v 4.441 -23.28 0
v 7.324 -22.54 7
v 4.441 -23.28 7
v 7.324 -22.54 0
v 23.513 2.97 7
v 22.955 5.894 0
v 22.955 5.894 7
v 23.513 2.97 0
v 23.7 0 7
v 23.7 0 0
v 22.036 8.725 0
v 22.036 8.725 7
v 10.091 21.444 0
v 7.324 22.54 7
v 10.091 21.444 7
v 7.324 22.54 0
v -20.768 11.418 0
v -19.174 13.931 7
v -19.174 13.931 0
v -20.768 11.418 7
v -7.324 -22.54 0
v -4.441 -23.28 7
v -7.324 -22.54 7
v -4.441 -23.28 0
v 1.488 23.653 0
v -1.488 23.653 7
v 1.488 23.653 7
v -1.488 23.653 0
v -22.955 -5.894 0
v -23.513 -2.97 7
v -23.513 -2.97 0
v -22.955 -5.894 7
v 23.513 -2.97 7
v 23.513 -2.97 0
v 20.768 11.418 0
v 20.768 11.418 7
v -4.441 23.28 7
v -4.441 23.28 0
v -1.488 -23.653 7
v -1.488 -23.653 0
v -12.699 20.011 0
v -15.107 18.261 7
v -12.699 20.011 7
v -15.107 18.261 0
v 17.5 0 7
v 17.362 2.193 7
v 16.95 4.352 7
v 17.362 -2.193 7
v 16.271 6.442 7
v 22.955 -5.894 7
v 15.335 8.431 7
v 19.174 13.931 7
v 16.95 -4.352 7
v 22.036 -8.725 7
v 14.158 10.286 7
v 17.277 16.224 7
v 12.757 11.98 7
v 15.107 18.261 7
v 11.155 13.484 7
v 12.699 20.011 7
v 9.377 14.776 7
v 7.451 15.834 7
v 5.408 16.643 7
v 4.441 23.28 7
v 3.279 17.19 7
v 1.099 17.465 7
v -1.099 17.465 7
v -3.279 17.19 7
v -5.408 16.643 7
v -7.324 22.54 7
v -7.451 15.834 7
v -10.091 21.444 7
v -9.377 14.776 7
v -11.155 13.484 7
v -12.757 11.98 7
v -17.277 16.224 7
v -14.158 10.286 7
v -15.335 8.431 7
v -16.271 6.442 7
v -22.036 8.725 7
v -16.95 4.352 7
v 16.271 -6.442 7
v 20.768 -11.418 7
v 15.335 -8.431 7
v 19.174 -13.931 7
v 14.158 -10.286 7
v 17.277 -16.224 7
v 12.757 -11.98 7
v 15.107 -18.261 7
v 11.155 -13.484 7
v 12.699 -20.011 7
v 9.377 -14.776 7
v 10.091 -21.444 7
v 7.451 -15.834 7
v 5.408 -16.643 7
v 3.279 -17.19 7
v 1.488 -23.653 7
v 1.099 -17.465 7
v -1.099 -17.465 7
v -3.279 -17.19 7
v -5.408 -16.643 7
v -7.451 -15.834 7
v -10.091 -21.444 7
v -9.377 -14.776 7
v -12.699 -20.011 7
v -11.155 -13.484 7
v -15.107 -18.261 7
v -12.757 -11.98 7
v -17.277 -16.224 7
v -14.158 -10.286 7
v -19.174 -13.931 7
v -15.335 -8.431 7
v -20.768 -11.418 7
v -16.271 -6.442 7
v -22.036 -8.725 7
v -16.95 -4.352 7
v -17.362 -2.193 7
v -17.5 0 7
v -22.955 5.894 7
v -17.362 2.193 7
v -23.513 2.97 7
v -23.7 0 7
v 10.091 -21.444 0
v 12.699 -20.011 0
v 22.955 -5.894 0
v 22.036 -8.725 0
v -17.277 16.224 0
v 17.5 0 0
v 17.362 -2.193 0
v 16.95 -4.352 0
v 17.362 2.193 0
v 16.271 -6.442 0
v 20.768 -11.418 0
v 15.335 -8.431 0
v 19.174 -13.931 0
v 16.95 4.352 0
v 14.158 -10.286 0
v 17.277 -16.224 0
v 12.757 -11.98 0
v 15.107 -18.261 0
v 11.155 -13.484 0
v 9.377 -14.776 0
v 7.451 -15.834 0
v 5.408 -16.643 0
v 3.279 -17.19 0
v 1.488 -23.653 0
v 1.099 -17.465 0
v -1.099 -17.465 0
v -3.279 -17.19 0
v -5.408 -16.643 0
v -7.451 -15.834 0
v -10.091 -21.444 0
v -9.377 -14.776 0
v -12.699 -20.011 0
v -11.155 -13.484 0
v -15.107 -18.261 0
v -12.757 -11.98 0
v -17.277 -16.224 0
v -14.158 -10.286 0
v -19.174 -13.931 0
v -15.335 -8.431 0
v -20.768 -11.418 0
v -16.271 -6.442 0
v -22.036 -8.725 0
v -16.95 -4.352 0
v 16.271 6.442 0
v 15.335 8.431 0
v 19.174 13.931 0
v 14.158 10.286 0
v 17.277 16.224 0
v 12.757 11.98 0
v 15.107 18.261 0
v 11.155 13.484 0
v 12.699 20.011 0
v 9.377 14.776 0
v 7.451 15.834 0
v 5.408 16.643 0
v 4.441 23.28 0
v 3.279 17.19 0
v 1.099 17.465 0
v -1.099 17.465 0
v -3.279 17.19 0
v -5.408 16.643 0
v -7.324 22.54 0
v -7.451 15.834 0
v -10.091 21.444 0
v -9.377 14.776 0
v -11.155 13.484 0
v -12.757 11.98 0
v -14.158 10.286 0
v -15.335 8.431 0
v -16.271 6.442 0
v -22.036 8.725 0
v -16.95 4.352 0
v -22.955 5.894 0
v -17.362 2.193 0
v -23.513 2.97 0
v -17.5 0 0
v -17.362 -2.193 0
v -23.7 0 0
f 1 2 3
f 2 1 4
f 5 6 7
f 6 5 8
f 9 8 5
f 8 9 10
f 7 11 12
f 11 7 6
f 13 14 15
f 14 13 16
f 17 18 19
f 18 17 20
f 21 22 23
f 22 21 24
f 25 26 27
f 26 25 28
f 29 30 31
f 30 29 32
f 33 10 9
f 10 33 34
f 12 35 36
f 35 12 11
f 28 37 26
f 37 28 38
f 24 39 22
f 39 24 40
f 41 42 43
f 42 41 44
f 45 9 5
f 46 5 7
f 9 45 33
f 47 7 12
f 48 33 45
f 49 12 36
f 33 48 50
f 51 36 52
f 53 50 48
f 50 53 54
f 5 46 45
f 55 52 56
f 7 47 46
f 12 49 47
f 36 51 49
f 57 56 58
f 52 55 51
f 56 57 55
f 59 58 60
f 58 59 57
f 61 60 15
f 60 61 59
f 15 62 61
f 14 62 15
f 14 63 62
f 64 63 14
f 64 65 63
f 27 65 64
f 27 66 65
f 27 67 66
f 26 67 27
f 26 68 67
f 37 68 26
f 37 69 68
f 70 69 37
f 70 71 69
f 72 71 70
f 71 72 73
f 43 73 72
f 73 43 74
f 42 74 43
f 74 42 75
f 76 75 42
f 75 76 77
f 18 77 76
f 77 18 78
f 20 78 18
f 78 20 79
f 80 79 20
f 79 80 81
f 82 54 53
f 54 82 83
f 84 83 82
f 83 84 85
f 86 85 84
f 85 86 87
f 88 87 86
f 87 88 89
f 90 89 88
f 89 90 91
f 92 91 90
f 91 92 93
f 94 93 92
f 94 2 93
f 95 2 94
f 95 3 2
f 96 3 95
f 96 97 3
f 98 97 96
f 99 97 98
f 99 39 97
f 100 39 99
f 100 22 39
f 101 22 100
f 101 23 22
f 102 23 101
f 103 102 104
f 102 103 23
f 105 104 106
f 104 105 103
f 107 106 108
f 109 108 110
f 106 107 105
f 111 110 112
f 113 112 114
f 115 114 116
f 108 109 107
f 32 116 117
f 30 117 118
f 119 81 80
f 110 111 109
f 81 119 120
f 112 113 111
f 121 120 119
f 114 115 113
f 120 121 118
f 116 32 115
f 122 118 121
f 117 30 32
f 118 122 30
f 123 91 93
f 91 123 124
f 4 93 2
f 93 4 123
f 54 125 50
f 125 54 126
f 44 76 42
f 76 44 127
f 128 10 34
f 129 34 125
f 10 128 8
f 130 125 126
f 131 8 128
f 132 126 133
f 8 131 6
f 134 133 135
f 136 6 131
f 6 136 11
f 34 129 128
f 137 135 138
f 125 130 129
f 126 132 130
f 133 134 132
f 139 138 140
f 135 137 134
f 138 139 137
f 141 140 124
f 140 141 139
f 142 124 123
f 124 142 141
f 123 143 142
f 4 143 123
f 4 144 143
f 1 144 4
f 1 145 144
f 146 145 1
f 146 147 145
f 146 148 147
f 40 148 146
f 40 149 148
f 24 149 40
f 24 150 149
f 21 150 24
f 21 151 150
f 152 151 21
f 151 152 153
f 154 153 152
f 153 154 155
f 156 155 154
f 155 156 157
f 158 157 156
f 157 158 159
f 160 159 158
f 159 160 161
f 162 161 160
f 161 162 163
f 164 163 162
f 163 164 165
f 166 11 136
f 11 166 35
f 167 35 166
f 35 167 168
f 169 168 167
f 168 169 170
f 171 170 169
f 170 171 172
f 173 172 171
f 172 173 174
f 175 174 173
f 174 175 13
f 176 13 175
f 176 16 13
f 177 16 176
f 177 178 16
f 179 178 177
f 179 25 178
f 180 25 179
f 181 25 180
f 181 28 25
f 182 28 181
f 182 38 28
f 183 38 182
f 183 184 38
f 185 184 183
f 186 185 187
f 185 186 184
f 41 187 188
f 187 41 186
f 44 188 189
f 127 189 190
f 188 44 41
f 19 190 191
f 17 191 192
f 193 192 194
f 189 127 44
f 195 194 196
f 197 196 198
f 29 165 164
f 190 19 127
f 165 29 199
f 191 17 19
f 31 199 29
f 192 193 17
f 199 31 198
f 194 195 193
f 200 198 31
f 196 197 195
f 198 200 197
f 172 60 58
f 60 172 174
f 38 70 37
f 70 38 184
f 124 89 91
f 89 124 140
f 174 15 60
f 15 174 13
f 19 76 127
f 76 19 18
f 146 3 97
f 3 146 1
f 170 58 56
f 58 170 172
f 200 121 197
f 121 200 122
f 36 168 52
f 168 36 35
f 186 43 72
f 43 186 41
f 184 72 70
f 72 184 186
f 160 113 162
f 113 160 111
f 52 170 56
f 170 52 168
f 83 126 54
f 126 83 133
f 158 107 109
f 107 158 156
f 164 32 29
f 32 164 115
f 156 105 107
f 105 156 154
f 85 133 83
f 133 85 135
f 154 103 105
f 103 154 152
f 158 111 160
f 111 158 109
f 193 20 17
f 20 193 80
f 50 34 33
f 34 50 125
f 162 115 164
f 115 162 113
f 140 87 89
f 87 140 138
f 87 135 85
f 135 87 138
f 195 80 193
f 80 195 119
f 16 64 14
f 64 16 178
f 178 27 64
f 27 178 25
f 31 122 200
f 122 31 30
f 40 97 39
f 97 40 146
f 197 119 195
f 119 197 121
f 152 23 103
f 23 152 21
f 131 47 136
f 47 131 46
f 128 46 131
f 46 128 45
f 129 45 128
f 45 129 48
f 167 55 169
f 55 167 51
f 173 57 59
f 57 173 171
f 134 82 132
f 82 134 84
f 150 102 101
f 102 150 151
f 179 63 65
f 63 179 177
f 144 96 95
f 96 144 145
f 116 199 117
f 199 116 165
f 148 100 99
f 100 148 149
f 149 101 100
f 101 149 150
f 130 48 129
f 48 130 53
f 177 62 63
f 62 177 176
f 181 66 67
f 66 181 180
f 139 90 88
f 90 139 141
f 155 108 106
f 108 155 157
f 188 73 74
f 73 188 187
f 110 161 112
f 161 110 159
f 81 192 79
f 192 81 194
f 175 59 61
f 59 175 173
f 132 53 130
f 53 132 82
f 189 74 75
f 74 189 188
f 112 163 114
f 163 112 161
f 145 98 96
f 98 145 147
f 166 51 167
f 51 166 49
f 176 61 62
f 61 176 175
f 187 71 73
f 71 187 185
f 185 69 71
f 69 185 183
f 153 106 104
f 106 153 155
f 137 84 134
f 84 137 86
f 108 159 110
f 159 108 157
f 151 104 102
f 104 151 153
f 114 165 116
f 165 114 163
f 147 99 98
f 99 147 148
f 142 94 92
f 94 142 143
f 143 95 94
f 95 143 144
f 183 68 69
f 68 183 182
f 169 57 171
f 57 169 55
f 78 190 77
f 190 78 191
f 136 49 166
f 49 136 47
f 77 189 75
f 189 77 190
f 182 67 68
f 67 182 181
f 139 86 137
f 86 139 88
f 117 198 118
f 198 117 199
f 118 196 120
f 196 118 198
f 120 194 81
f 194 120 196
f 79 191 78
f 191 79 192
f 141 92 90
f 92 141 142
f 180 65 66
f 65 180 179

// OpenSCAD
$fn = 50;


difference() {
	union() {
		cylinder(h = 7, r = 23.7000000000);
	}
	union() {
		cylinder(h = 7, r = 17.5000000000);
	}
}
